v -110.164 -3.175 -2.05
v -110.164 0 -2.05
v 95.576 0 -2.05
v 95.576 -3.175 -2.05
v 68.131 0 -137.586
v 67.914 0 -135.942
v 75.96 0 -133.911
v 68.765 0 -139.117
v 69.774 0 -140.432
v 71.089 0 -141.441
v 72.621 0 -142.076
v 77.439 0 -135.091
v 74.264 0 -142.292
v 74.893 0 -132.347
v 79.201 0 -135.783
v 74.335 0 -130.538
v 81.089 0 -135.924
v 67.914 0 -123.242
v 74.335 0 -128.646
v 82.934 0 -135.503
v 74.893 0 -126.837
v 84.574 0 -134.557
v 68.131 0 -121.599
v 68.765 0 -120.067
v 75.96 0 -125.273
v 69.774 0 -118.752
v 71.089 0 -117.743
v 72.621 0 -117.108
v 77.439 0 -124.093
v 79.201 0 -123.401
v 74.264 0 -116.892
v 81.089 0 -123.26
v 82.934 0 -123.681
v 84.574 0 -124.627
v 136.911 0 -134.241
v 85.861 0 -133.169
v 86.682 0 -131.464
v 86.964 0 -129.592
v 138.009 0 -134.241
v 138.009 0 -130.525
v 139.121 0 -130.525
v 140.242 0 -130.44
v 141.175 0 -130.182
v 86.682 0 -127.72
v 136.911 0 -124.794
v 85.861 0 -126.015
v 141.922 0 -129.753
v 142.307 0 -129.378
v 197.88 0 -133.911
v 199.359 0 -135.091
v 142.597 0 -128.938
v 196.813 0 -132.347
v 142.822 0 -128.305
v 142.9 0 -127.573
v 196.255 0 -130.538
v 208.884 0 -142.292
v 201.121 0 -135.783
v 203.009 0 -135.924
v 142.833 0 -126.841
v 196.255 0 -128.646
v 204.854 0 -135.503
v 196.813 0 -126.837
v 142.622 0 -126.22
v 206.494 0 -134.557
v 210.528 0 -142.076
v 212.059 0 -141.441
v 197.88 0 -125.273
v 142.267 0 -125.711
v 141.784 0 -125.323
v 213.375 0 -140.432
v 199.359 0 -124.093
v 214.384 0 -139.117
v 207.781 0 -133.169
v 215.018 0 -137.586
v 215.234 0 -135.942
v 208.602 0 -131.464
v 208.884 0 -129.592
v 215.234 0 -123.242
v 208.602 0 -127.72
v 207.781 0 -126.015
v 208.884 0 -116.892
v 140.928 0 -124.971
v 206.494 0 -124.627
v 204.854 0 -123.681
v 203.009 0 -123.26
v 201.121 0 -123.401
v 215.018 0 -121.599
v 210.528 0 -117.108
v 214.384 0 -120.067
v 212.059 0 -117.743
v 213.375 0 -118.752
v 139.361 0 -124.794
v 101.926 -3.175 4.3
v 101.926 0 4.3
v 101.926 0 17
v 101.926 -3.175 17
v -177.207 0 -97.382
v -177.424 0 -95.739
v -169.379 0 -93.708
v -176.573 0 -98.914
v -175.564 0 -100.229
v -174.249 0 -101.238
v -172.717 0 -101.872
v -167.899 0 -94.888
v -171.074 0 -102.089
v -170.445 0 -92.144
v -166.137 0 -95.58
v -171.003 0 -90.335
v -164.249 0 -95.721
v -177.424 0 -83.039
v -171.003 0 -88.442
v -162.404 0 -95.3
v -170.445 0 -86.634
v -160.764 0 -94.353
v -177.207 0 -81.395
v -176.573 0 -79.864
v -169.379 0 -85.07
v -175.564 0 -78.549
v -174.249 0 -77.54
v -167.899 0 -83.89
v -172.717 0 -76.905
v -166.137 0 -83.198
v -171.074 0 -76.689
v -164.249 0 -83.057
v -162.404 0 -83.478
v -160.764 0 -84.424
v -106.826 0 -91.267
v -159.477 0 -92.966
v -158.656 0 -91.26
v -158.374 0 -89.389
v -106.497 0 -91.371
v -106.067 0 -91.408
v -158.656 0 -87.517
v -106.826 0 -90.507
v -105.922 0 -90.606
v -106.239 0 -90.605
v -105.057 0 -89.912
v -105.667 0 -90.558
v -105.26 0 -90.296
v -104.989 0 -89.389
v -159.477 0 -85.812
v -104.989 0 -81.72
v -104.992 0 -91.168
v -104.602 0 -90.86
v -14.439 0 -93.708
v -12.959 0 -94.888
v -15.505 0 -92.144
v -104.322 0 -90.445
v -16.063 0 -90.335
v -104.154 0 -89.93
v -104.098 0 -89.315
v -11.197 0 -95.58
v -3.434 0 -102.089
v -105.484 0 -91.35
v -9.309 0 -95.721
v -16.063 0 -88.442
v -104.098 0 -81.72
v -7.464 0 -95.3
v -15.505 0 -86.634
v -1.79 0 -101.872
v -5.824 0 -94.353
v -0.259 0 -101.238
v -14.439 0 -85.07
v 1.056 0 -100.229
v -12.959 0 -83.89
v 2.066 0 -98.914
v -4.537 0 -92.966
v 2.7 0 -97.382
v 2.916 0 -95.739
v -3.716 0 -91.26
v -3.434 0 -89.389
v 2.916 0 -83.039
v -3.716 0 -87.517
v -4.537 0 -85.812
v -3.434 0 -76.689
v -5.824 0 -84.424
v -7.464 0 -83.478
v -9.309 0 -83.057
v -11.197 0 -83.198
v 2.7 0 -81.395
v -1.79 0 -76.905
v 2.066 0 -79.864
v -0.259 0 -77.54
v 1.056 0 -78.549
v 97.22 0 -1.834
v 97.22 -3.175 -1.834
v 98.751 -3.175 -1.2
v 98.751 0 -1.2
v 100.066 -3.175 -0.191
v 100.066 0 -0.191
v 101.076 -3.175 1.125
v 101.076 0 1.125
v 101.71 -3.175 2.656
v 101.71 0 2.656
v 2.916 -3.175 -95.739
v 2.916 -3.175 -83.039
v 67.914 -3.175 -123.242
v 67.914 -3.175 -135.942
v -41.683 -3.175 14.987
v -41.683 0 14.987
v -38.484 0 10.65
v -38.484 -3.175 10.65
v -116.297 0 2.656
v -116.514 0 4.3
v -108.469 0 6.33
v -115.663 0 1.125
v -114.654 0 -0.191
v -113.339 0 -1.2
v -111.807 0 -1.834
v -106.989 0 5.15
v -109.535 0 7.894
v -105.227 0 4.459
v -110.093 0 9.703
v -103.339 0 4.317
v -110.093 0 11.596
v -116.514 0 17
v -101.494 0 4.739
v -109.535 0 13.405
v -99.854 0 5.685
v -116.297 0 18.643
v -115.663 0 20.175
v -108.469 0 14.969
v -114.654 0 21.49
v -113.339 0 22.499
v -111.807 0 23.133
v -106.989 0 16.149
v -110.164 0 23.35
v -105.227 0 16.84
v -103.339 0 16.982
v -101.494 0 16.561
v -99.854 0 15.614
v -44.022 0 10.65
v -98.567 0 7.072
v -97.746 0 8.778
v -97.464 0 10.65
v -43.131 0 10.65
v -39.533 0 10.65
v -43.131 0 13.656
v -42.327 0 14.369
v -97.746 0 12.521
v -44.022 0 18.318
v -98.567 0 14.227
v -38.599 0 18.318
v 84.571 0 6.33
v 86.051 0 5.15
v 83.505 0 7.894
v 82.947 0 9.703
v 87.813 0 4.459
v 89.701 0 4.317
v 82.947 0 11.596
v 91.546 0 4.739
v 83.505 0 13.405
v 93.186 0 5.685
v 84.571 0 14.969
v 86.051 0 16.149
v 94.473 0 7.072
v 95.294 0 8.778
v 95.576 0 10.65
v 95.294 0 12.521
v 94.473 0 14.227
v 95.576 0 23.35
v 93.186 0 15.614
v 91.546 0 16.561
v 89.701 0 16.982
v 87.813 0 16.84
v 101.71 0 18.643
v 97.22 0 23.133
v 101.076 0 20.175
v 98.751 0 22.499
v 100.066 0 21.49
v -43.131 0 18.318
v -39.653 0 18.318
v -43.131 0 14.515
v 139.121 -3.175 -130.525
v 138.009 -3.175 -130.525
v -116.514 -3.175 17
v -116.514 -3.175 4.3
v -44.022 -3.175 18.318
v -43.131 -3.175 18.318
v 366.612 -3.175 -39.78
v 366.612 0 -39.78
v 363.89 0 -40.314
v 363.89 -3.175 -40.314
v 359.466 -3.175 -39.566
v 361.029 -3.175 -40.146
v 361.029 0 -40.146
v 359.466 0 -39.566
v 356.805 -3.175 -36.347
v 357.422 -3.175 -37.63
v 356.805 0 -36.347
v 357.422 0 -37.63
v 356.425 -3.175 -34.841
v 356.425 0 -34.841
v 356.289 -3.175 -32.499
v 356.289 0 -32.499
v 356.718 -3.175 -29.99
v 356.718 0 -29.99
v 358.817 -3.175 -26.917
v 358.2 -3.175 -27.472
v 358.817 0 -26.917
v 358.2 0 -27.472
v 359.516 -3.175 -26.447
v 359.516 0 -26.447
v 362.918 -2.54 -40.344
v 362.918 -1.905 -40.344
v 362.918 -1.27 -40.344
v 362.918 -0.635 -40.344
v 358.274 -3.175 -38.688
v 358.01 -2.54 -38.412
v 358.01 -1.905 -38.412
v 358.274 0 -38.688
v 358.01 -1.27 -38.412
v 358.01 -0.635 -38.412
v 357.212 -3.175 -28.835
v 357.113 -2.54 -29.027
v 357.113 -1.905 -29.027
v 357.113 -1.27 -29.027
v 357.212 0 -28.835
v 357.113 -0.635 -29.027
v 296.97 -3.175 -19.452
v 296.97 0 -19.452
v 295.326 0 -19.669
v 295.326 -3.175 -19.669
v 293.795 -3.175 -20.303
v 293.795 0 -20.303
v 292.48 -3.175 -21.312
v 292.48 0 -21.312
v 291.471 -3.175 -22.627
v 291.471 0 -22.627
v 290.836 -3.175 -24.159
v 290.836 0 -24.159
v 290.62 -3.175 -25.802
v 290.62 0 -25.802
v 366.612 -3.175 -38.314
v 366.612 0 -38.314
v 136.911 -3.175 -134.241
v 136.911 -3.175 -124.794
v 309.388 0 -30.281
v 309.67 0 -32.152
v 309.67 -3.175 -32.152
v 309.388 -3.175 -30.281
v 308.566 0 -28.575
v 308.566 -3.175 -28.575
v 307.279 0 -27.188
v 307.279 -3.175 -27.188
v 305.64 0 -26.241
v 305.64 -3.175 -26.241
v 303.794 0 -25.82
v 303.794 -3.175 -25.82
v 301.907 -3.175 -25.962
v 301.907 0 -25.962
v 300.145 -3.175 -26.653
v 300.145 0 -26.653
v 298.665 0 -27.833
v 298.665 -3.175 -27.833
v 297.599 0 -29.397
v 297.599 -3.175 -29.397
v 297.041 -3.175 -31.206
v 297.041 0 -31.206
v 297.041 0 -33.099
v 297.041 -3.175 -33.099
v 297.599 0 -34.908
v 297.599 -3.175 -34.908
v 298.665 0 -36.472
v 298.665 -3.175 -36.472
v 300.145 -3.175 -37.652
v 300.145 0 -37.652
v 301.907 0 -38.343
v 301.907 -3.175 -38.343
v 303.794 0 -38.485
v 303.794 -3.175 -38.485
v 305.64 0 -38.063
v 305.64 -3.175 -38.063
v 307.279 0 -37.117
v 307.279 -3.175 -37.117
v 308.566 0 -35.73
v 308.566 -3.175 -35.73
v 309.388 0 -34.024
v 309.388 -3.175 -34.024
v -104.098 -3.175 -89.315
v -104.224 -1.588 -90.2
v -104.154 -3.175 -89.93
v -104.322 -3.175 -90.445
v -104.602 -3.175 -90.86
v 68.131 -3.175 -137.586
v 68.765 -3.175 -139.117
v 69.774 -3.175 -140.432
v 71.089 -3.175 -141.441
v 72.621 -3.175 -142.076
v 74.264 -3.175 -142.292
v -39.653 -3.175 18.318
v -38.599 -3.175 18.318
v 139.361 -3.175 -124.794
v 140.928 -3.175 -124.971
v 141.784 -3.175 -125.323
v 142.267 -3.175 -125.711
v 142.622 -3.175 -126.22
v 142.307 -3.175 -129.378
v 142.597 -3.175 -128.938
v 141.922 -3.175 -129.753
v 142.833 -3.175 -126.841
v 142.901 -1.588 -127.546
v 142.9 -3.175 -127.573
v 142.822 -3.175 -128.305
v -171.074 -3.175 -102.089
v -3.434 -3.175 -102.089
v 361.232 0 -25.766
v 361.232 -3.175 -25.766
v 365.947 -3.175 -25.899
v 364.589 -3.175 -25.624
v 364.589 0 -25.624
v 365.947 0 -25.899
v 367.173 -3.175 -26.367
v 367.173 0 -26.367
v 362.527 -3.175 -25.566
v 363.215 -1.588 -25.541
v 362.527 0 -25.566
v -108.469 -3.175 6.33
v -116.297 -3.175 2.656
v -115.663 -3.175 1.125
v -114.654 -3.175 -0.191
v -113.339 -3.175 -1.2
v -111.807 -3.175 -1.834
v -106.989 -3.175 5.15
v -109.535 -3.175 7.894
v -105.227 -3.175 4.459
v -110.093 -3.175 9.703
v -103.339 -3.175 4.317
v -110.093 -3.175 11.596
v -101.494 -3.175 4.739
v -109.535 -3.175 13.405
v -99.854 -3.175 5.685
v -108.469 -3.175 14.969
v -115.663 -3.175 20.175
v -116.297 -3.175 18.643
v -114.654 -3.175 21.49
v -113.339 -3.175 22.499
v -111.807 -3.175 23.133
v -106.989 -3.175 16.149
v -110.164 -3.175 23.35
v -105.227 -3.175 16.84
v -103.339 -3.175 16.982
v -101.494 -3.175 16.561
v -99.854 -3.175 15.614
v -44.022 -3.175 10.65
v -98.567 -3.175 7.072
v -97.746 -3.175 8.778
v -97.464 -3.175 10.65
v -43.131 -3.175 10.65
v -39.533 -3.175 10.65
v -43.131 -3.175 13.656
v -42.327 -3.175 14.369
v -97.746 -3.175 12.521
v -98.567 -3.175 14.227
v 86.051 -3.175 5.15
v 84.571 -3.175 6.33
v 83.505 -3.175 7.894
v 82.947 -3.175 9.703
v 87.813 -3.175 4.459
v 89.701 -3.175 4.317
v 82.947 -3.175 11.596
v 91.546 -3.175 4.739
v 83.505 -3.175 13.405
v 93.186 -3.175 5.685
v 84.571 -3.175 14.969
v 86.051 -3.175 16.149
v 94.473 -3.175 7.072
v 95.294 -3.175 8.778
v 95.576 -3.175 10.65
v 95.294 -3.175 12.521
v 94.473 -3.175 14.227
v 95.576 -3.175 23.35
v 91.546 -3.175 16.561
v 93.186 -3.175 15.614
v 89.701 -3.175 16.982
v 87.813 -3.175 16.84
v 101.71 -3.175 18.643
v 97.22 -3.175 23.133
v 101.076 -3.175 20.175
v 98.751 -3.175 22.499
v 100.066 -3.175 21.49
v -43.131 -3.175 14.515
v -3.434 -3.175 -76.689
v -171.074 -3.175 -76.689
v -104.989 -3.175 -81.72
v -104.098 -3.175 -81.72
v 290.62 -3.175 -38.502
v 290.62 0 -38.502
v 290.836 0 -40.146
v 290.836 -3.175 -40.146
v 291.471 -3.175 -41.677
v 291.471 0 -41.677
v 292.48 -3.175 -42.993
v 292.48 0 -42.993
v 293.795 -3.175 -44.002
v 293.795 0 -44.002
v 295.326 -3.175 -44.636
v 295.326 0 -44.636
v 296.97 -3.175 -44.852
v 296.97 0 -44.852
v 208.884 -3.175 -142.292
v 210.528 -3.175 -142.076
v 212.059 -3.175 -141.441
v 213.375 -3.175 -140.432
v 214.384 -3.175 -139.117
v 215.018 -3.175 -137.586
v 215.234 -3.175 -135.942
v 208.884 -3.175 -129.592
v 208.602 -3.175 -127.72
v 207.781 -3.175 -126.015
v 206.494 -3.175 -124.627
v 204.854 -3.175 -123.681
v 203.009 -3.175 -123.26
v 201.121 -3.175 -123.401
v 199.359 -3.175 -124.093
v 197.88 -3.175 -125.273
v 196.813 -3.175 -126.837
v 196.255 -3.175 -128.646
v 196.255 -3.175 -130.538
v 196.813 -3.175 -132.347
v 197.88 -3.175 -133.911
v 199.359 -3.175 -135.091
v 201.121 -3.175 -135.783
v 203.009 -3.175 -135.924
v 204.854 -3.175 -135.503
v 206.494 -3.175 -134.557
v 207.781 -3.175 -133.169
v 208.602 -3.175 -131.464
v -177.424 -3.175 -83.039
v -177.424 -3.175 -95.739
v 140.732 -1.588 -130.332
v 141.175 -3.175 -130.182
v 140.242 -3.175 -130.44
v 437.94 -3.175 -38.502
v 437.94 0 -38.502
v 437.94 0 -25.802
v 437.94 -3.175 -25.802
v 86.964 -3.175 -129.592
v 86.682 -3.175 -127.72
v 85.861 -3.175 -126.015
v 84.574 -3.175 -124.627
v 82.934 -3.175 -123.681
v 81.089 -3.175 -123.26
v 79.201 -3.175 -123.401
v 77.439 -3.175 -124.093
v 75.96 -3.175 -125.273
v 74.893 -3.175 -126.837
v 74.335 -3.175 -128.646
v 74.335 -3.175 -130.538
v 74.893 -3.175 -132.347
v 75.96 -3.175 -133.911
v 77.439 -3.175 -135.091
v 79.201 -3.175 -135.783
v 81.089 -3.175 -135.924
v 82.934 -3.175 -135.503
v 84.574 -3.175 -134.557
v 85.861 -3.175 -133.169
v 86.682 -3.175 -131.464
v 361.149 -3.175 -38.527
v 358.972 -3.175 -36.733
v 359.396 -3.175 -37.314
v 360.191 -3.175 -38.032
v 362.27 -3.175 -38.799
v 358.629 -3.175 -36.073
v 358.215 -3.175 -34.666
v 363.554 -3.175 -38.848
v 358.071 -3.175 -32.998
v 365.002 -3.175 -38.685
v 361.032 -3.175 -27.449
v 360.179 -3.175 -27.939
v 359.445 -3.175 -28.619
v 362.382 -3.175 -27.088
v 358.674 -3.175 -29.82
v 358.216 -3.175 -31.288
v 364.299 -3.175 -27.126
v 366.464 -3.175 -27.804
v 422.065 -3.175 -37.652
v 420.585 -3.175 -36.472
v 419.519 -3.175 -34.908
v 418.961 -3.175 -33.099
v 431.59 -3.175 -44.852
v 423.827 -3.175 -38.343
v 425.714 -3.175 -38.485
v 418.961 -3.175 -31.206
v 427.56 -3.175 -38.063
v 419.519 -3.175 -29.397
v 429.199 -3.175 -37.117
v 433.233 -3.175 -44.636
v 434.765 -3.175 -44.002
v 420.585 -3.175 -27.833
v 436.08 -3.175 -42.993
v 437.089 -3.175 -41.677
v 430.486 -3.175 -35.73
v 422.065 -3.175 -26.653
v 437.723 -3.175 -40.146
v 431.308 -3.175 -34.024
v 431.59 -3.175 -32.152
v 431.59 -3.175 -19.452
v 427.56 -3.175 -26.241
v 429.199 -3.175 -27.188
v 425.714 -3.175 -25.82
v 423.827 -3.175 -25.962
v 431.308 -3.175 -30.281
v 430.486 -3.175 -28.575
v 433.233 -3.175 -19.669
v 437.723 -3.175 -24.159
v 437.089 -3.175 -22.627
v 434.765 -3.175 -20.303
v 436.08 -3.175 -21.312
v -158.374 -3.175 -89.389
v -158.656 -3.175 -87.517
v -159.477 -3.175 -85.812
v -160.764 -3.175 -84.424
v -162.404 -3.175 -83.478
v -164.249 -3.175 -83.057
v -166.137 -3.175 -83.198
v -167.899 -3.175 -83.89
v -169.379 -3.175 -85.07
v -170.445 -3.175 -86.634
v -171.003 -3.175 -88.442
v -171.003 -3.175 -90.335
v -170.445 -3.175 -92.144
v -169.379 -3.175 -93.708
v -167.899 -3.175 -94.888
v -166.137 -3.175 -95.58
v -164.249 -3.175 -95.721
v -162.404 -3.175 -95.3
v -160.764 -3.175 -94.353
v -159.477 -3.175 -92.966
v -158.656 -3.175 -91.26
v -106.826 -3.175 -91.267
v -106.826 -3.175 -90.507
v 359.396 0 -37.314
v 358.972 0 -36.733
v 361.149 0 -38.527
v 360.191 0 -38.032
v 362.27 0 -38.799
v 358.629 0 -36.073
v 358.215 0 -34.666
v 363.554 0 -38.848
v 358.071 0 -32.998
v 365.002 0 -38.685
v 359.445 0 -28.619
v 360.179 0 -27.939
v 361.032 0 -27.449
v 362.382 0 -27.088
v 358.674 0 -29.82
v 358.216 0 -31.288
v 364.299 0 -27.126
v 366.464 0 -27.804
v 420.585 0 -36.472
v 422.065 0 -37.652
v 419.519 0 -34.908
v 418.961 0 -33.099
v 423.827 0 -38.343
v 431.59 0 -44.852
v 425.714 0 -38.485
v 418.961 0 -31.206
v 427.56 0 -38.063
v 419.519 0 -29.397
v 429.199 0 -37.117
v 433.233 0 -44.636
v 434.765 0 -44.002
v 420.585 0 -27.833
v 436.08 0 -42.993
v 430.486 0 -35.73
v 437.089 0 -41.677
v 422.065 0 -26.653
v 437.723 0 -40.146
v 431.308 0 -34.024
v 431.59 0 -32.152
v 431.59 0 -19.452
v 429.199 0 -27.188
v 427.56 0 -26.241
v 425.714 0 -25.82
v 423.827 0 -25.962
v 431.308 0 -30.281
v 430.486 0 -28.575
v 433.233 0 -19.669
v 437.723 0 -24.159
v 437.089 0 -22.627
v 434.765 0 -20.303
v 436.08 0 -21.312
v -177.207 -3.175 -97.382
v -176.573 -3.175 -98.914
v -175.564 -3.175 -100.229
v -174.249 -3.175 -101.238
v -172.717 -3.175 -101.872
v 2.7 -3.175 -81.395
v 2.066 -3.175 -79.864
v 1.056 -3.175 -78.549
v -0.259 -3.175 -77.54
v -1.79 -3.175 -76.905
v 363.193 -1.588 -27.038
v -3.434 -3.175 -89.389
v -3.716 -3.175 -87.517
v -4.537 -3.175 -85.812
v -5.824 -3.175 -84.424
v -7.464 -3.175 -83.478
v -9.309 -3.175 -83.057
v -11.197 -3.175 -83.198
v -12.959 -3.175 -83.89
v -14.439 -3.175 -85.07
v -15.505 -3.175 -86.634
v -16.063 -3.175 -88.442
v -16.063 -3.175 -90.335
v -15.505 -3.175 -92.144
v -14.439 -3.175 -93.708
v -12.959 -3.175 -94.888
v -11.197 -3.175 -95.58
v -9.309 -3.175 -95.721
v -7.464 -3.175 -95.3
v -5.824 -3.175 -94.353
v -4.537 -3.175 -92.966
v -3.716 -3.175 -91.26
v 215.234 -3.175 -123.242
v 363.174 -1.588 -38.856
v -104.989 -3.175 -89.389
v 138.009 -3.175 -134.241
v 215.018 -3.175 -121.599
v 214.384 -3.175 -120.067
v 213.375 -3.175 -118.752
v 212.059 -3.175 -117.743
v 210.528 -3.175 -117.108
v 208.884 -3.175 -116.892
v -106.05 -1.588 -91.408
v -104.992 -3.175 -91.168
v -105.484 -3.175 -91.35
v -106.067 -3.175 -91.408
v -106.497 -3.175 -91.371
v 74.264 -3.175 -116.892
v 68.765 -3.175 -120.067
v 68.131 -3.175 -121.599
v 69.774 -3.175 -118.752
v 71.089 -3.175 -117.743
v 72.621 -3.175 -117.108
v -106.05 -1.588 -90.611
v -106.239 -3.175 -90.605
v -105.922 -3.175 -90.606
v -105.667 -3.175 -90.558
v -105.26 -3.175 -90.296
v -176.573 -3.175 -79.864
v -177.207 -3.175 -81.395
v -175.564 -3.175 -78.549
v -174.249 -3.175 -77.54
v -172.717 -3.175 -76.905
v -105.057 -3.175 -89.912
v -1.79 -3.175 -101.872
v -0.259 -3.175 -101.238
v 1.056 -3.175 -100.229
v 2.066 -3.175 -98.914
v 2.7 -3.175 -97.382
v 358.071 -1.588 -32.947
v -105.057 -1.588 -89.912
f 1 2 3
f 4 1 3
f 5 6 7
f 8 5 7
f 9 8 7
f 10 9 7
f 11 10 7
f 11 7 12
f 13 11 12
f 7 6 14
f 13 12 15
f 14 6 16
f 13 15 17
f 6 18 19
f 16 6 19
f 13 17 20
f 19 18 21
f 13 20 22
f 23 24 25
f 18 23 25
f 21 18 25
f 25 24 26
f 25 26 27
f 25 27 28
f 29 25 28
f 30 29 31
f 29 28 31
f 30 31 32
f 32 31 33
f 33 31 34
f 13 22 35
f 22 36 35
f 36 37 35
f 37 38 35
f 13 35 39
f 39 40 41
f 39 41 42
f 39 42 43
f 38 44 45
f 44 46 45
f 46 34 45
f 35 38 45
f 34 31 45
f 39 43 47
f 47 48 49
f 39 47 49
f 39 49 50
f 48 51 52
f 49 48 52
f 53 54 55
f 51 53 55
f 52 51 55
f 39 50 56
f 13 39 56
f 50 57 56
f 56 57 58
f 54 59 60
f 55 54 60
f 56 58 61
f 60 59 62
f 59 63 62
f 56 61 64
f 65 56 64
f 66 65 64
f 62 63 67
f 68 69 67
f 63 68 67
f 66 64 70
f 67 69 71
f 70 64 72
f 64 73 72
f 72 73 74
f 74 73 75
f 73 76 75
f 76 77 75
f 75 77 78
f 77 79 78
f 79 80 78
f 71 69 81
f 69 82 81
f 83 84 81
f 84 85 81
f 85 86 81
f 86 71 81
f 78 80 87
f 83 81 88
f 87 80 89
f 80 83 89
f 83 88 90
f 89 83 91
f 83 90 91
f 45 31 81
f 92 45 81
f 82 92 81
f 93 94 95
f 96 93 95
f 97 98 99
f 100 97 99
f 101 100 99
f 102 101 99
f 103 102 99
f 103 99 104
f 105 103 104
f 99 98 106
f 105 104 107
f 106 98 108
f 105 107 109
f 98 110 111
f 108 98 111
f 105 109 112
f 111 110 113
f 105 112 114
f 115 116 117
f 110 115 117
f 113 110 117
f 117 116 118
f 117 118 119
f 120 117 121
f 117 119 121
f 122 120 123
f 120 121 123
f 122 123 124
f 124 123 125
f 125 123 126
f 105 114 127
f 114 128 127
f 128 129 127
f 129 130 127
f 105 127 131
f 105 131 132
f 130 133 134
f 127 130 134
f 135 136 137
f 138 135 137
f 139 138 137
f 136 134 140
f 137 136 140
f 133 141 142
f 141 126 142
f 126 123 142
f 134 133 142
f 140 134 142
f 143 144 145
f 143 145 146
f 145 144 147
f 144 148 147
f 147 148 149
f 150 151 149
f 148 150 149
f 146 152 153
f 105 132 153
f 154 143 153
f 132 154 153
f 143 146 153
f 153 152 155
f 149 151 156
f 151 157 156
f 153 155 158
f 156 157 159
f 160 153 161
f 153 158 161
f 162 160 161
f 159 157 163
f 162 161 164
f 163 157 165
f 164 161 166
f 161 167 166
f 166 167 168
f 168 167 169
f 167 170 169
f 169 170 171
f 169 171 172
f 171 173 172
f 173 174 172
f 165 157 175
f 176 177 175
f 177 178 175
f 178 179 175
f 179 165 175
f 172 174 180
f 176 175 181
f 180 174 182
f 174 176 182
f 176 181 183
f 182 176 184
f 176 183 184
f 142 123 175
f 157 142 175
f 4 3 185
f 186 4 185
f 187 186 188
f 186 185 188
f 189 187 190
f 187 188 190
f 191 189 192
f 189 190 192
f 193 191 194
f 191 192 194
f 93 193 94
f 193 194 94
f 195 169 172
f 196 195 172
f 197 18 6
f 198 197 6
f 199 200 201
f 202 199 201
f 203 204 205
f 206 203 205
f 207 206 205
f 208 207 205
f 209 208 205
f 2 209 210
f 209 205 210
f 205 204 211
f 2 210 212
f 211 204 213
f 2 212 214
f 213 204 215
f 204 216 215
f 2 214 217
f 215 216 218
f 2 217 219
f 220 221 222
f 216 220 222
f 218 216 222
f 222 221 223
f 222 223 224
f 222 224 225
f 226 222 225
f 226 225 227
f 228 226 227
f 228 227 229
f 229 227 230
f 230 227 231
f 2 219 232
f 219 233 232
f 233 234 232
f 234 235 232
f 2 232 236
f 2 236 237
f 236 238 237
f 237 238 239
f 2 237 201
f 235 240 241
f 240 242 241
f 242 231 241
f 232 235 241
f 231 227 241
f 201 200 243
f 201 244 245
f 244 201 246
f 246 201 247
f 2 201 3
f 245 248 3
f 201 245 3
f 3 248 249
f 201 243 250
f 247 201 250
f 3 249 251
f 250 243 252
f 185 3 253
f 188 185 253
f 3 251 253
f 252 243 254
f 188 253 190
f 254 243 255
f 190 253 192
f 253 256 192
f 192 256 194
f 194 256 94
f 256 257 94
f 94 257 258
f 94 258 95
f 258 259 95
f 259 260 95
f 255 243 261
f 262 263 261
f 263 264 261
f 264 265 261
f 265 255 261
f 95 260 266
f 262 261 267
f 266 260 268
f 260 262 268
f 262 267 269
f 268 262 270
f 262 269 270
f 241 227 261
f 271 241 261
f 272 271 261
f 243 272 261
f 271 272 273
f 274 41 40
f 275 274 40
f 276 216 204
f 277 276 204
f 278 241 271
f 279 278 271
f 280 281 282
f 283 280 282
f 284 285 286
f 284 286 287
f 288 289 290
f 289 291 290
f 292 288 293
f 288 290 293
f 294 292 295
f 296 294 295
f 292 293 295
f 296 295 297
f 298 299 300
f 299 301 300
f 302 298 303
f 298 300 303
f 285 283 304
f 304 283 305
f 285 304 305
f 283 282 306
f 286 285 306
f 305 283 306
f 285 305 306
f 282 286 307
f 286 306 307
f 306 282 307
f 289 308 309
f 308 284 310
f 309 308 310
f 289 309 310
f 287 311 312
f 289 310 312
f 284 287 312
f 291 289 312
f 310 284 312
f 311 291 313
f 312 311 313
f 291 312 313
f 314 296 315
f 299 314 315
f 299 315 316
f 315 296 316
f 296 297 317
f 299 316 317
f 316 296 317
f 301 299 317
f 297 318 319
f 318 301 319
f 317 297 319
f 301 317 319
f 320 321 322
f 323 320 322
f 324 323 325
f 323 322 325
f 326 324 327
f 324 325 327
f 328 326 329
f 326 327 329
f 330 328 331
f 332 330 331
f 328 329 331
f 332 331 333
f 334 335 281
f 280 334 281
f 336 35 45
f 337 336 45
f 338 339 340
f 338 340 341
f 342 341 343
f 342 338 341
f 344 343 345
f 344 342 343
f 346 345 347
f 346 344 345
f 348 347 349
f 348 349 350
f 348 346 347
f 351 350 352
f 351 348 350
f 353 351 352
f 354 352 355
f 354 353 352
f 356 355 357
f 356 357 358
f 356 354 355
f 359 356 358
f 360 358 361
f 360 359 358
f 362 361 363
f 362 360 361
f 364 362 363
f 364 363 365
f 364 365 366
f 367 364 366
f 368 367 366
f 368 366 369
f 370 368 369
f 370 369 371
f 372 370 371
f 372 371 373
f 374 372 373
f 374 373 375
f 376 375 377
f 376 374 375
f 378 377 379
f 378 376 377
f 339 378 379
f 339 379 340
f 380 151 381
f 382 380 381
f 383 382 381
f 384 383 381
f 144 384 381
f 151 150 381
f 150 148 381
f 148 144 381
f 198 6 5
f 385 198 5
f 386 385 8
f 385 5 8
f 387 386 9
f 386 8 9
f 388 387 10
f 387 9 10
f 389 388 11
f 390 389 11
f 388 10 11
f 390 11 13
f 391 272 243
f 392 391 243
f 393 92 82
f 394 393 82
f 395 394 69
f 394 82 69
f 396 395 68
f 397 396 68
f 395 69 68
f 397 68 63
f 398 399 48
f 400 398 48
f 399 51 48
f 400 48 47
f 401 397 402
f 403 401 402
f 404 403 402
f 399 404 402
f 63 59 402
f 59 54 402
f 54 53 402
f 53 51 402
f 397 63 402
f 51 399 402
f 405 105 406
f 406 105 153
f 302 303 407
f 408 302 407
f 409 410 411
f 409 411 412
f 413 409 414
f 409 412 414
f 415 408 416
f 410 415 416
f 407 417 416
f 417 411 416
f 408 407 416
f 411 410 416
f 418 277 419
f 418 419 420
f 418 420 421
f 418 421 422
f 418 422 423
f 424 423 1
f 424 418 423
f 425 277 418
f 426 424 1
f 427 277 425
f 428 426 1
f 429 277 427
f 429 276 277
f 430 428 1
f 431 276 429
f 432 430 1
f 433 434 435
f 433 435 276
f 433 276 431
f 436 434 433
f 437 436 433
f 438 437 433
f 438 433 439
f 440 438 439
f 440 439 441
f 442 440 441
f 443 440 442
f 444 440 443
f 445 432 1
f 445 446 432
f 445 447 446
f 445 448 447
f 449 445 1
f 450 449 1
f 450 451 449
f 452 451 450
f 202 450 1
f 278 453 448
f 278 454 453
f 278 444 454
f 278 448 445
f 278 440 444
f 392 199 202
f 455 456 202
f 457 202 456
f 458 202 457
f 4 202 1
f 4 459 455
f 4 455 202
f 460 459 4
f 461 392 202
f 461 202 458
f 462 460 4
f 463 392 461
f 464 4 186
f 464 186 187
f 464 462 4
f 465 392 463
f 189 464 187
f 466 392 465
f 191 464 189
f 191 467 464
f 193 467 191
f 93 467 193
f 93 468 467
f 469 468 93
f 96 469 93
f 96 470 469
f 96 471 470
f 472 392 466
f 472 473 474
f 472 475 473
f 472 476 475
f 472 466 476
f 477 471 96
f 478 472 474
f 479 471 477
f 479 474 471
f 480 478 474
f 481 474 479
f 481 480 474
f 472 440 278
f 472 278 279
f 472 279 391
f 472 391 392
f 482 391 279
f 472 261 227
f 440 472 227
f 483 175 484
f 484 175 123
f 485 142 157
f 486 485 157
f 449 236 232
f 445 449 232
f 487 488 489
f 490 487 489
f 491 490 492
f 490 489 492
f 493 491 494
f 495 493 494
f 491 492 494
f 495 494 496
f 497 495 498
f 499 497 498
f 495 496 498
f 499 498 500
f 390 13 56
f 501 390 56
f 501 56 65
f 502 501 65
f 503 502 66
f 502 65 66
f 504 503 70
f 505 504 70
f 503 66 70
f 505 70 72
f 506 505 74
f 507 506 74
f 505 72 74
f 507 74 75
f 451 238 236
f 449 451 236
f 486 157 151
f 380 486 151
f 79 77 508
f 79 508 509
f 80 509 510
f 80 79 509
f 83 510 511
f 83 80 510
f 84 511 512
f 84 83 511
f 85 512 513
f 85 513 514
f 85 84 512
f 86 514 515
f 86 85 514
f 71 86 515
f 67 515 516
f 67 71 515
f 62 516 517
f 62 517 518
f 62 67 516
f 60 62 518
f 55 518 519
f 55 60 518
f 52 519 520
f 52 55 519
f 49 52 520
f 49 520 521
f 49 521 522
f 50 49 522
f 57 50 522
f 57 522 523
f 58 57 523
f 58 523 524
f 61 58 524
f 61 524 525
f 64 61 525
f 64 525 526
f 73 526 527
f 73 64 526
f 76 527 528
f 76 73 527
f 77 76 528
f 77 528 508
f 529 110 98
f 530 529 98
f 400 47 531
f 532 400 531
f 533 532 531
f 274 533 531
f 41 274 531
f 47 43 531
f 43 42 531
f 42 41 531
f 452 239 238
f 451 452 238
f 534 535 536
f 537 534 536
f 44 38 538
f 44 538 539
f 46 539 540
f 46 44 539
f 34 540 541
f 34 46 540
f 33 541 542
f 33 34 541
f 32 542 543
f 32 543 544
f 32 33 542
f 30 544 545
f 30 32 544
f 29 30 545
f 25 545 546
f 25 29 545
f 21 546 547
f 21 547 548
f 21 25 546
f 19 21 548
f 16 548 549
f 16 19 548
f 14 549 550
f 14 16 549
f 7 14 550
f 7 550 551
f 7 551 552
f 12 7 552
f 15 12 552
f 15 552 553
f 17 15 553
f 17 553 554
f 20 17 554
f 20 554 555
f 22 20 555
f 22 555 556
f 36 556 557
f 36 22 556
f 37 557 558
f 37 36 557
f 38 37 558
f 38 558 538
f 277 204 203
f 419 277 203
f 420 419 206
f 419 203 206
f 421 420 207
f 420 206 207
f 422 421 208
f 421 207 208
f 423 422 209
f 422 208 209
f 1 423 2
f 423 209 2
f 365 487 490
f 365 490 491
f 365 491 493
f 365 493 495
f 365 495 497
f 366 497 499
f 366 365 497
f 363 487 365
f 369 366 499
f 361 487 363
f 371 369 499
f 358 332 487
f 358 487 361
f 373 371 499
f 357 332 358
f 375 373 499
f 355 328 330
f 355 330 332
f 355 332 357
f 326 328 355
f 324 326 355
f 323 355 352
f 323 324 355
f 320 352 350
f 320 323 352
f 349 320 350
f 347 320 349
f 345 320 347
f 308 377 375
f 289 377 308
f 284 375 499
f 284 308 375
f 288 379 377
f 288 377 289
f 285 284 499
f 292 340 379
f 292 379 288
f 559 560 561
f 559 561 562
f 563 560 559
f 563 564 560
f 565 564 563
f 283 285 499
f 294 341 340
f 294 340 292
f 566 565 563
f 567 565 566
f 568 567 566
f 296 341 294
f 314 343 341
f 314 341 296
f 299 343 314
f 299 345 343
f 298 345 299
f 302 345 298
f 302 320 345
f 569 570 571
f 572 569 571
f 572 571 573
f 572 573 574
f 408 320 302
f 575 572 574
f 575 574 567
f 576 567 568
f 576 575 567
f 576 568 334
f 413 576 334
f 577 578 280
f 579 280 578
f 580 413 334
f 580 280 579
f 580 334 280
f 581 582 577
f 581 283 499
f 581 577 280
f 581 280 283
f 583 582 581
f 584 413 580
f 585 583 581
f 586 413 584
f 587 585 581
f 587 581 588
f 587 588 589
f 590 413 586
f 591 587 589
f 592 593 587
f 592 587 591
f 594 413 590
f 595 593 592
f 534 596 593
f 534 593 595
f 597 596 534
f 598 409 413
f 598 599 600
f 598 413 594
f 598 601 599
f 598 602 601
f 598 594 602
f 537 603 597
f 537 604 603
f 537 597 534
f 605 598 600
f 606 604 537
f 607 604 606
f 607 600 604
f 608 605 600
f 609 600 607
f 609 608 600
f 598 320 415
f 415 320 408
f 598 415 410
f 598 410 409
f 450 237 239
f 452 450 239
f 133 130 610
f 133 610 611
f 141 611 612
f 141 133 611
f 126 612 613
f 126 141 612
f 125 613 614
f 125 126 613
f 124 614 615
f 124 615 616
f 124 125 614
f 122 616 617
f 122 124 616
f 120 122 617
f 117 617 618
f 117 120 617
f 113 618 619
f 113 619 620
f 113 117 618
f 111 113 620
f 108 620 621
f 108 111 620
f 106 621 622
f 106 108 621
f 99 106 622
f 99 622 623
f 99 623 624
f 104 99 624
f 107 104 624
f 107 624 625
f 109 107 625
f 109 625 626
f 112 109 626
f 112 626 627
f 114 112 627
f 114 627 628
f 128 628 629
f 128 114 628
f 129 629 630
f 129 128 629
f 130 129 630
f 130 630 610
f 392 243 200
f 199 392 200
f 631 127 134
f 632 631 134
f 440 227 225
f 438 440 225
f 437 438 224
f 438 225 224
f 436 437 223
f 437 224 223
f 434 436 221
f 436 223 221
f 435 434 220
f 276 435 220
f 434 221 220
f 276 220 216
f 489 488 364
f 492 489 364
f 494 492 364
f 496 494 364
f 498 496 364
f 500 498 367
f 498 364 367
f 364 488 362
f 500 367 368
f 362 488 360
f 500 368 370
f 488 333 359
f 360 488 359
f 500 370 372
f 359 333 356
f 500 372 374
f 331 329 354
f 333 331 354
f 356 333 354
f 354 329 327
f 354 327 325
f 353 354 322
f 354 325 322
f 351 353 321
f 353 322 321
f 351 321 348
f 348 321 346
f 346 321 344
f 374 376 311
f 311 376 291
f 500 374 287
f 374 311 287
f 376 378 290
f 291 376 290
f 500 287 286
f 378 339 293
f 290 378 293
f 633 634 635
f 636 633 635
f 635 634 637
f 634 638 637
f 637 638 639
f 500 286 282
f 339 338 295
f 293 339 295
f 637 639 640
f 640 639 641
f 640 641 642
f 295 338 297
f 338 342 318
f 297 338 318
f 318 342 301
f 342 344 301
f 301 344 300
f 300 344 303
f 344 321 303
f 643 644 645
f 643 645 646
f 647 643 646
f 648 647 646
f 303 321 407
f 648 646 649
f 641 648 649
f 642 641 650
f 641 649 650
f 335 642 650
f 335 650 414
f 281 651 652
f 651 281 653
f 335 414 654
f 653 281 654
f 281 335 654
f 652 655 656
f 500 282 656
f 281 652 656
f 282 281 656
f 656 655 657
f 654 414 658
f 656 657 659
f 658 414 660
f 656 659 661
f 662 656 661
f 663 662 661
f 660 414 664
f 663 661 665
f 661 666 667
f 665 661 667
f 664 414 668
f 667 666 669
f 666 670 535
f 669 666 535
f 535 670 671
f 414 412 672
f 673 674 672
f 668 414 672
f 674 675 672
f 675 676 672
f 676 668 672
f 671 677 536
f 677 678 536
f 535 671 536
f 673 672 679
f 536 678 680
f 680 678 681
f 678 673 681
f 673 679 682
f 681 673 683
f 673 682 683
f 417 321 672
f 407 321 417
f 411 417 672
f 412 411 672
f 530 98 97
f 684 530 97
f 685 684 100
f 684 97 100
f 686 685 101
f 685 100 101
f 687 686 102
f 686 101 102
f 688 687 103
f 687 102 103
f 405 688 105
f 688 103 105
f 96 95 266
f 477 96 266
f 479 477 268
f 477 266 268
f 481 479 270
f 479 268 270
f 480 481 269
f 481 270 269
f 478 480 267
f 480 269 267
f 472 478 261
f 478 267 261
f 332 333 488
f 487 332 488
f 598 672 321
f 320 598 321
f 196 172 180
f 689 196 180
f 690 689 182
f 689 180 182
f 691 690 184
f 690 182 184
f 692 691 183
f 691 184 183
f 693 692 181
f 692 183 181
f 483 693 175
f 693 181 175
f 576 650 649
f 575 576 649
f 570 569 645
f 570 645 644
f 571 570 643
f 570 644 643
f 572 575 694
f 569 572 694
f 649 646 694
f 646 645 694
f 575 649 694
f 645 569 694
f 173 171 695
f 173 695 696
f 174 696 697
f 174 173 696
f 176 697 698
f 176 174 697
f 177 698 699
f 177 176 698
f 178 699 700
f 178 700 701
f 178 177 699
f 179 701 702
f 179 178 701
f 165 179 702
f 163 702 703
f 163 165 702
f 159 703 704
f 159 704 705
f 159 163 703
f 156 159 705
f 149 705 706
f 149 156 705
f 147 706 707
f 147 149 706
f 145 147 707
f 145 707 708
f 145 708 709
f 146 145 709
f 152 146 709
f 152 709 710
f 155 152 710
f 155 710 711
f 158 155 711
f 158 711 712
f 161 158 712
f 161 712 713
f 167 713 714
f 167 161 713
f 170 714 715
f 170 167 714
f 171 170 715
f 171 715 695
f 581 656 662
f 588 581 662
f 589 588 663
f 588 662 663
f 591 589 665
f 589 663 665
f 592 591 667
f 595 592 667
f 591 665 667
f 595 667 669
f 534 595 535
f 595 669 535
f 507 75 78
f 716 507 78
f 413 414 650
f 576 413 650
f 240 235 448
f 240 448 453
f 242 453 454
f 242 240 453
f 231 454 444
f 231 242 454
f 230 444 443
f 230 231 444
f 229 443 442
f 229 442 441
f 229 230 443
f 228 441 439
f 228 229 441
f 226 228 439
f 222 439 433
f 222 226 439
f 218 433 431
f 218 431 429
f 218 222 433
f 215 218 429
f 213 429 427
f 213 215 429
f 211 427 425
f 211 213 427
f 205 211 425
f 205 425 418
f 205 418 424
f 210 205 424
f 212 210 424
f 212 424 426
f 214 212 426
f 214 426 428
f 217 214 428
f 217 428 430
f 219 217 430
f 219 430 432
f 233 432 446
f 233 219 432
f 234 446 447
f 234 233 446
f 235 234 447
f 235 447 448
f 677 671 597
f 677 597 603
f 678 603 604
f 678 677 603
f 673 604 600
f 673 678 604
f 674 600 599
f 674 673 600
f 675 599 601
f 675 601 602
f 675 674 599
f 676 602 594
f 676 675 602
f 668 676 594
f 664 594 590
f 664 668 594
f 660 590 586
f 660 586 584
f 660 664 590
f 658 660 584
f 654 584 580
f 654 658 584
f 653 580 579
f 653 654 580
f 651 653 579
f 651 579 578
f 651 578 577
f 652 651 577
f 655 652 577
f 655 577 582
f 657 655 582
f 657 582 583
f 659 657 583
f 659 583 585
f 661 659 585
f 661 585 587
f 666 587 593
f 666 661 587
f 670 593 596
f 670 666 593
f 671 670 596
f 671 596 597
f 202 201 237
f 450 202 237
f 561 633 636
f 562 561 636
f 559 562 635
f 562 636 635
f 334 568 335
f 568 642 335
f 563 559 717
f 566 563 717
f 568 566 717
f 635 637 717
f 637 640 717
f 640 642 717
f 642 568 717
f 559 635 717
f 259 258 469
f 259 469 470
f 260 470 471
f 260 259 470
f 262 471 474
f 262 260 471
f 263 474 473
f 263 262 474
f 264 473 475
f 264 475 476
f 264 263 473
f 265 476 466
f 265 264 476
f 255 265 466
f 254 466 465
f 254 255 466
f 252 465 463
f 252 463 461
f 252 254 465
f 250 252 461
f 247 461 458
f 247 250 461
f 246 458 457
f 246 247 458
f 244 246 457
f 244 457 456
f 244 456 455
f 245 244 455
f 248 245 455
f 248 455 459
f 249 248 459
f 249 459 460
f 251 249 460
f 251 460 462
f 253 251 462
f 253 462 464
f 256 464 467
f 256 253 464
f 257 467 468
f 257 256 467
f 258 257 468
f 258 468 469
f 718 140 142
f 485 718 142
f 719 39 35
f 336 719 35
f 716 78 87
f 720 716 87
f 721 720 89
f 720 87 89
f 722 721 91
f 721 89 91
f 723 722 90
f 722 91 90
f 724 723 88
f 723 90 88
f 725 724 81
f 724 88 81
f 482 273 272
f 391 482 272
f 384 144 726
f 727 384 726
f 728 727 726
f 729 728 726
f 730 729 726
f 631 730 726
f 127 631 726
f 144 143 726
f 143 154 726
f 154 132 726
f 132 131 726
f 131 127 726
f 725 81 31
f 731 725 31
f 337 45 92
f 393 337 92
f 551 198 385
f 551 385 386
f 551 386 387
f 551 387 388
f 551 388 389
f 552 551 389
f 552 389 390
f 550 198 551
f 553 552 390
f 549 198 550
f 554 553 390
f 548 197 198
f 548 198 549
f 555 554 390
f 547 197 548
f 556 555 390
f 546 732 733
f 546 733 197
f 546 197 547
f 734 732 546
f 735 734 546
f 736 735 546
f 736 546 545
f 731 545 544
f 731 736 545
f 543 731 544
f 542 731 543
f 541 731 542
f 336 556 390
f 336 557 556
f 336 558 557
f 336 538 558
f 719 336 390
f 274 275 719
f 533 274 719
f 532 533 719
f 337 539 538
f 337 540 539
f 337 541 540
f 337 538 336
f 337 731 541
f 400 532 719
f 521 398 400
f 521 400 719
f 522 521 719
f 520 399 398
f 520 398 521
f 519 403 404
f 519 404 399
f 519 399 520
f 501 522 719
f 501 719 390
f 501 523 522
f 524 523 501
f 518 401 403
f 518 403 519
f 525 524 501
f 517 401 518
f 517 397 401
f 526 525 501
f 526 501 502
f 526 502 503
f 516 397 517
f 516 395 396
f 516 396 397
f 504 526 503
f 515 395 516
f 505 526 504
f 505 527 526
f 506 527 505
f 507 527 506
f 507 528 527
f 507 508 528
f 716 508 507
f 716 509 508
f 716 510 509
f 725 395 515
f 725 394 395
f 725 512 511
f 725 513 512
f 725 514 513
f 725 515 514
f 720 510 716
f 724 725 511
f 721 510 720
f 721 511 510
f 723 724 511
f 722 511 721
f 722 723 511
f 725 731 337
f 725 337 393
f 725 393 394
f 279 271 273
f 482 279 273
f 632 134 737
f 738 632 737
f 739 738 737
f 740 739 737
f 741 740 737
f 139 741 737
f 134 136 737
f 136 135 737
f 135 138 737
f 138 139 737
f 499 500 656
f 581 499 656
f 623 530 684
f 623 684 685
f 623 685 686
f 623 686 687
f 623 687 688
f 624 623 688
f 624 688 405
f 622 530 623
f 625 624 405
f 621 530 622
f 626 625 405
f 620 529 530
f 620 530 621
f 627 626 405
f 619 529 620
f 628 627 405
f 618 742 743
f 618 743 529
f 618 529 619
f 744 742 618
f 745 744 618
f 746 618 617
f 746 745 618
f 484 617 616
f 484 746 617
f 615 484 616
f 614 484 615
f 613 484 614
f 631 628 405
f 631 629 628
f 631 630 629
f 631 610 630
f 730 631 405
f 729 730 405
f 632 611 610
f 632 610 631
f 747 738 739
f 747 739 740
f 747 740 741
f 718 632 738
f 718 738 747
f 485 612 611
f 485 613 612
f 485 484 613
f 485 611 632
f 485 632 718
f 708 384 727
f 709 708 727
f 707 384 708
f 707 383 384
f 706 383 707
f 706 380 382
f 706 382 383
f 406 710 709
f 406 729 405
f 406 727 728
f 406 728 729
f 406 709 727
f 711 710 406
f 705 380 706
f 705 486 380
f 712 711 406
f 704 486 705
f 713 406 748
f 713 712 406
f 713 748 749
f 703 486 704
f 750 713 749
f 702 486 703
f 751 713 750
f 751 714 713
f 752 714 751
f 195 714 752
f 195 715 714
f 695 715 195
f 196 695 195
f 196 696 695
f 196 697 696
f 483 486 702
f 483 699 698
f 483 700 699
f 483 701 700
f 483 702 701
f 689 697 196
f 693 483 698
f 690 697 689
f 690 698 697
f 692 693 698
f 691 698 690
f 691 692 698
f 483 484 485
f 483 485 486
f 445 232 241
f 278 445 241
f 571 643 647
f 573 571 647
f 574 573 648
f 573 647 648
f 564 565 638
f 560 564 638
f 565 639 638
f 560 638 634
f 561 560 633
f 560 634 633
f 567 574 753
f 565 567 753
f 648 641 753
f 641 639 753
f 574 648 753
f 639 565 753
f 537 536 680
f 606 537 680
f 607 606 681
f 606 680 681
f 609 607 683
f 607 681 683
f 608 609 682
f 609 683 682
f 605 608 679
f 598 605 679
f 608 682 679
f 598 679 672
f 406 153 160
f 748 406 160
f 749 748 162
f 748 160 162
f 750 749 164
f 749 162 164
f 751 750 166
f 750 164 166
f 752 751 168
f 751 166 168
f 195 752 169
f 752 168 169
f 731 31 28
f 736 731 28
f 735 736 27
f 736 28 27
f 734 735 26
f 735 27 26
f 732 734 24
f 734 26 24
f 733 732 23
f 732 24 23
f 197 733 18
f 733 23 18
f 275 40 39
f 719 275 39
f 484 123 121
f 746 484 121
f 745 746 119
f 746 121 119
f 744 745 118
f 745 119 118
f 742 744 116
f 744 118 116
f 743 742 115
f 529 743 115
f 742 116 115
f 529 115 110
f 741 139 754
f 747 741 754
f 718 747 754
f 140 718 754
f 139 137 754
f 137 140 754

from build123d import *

# Parameters (mm, degrees)
F1_R     = 6.35
F2_DEPTH = 3.175
F3_R     = 6.35
F4_DEPTH = 3.175
F5_R     = 6.35
F6_DEPTH = 3.175
F7_R     = 6.35
F8_DEPTH = 3.175


# Not quite as in the source:
# - a length typed as a fraction of an inch, garbled in the dataset ("3 / 203.2 mm" for 3/8 in), is restored


with BuildPart() as f2:
    # F1 (on Front) → F2 (new body)
    with BuildSketch(Plane.XZ):
        with BuildLine():
            Line((95.5763677621, 23.3495529922), (-110.1636322379, 23.3495529922))
            ThreePointArc((-110.1636322379, 23.3495529922), (-114.6537602984, 21.4896810527), (-116.5136322379, 16.9995529922))
            Line((-116.5136322379, 16.9995529922), (-116.5136322379, 4.2995529922))
            ThreePointArc((-116.5136322379, 4.2995529922), (-114.6537602984, -0.1905750684), (-110.1636322379, -2.0504470078))
            Line((-110.1636322379, -2.0504470078), (95.5763677621, -2.0504470078))
            ThreePointArc((95.5763677621, -2.0504470078), (100.0664958226, -0.1905750684), (101.9263677621, 4.2995529922))
            Line((101.9263677621, 4.2995529922), (101.9263677621, 16.9995529922))
            ThreePointArc((101.9263677621, 16.9995529922), (100.0664958226, 21.4896810527), (95.5763677621, 23.3495529922))
        make_face()
        with Locations((-103.8136322379, 10.6495529922)):
            Circle(F1_R, mode=Mode.SUBTRACT)
        Polygon((-41.6826481417, 14.9866065492), (-38.4835676154, 10.6495529922), (-39.5325840524, 10.6495529922), (-42.3271638406, 14.3689456712), (-43.1311300379, 13.655614494), (-43.1311300379, 10.6495529922), (-44.0223744027, 10.6495529922), (-44.0223744027, 18.3182827531), (-43.1311300379, 18.3182827531), (-43.1311300379, 14.5149687592), (-39.653430746, 18.3182827531), (-38.5993790301, 18.3182827531), align=None, mode=Mode.SUBTRACT)
        with Locations((89.2263677621, 10.6495529922)):
            Circle(F1_R, mode=Mode.SUBTRACT)
    extrude(amount=F2_DEPTH)


with BuildPart() as f4:
    # F3 (on Front) → F4 (new body)
    with BuildSketch(Plane.XZ):
        with BuildLine():
            Line((-3.4336355138, -76.6887728453), (-171.0736355138, -76.6887728453))
            ThreePointArc((-171.0736355138, -76.6887728453), (-175.5637635743, -78.5486447847), (-177.4236355138, -83.0387728453))
            Line((-177.4236355138, -83.0387728453), (-177.4236355138, -95.7387728453))
            ThreePointArc((-177.4236355138, -95.7387728453), (-175.5637635743, -100.2289009058), (-171.0736355138, -102.0887728453))
            Line((-171.0736355138, -102.0887728453), (-3.4336355138, -102.0887728453))
            ThreePointArc((-3.4336355138, -102.0887728453), (1.0564925468, -100.2289009058), (2.9163644862, -95.7387728453))
            Line((2.9163644862, -95.7387728453), (2.9163644862, -83.0387728453))
            ThreePointArc((2.9163644862, -83.0387728453), (1.0564925468, -78.5486447847), (-3.4336355138, -76.6887728453))
        make_face()
        with Locations((-9.7836355138, -89.3887728453)):
            Circle(F3_R, mode=Mode.SUBTRACT)
        with Locations((-164.7236355138, -89.3887728453)):
            Circle(F3_R, mode=Mode.SUBTRACT)
        with BuildLine():
            add(Edge.make_bspline(
                [(-104.6017276977, -90.8599134965), (-105.1052555874, -91.4079196832), (-106.0502095939, -91.4079196832)],
                knots=[0, 0, 0, 1, 1, 1], degree=2))
            add(Edge.make_bspline(
                [(-106.0502095939, -91.4079196832), (-106.5419884995, -91.4079196832), (-106.8256425441, -91.266931874)],
                knots=[0, 0, 0, 1, 1, 1], degree=2))
            Line((-106.8256425441, -91.266931874), (-106.8256425441, -90.5066047605))
            add(Edge.make_bspline(
                [(-106.8256425441, -90.5066047605), (-106.4530319057, -90.6106671911), (-106.0502095939, -90.6106671911)],
                knots=[0, 0, 0, 1, 1, 1], degree=2))
            add(Edge.make_bspline(
                [(-106.0502095939, -90.6106671911), (-105.5298974411, -90.6106671911), (-105.2596708069, -90.29596226)],
                knots=[0, 0, 0, 1, 1, 1], degree=2))
            add(Edge.make_bspline(
                [(-105.2596708069, -90.29596226), (-104.9894441728, -89.9812573289), (-104.9894441728, -89.3887728453)],
                knots=[0, 0, 0, 1, 1, 1], degree=2))
            Line((-104.9894441728, -89.3887728453), (-104.9894441728, -81.7200430843))
            Line((-104.9894441728, -81.7200430843), (-104.0981998079, -81.7200430843))
            Line((-104.0981998079, -81.7200430843), (-104.0981998079, -89.3149220881))
            add(Edge.make_bspline(
                [(-104.0981998079, -89.3149220881), (-104.0981998079, -90.3119073098), (-104.6017276977, -90.8599134965)],
                knots=[0, 0, 0, 1, 1, 1], degree=2))
        make_face(mode=Mode.SUBTRACT)
    extrude(amount=F4_DEPTH)


with BuildPart() as f6:
    # F5 (on Front) → F6 (new body)
    with BuildSketch(Plane.XZ):
        with BuildLine():
            Line((208.8844542503, -116.8920610428), (74.2644542503, -116.8920610428))
            ThreePointArc((74.2644542503, -116.8920610428), (69.7743261898, -118.7519329823), (67.9144542503, -123.2420610428))
            Line((67.9144542503, -123.2420610428), (67.9144542503, -135.9420610428))
            ThreePointArc((67.9144542503, -135.9420610428), (69.7743261898, -140.4321891033), (74.2644542503, -142.2920610428))
            Line((74.2644542503, -142.2920610428), (208.8844542503, -142.2920610428))
            ThreePointArc((208.8844542503, -142.2920610428), (213.3745823109, -140.4321891033), (215.2344542503, -135.9420610428))
            Line((215.2344542503, -135.9420610428), (215.2344542503, -123.2420610428))
            ThreePointArc((215.2344542503, -123.2420610428), (213.3745823109, -118.7519329823), (208.8844542503, -116.8920610428))
        make_face()
        with Locations((202.5344542503, -129.5920610428)):
            Circle(F5_R, mode=Mode.SUBTRACT)
        with Locations((80.6144542503, -129.5920610428)):
            Circle(F5_R, mode=Mode.SUBTRACT)
        with BuildLine():
            add(Edge.make_bspline(
                [(139.3608329236, -124.7941682377), (142.9005294922, -124.7941682377), (142.9005294922, -127.5461169134)],
                knots=[0, 0, 0, 1, 1, 1], degree=2))
            add(Edge.make_bspline(
                [(142.9005294922, -127.5461169134), (142.9005294922, -128.9810172748), (141.9215304704, -129.7532583194)],
                knots=[0, 0, 0, 1, 1, 1], degree=2))
            add(Edge.make_bspline(
                [(141.9215304704, -129.7532583194), (140.9425314487, -130.525499364), (139.1209936701, -130.525499364)],
                knots=[0, 0, 0, 1, 1, 1], degree=2))
            Line((139.1209936701, -130.525499364), (138.0086357531, -130.525499364))
            Line((138.0086357531, -130.525499364), (138.0086357531, -134.2409402132))
            Line((138.0086357531, -134.2409402132), (136.9107508945, -134.2409402132))
            Line((136.9107508945, -134.2409402132), (136.9107508945, -124.7941682377))
            Line((136.9107508945, -124.7941682377), (139.3608329236, -124.7941682377))
        make_face(mode=Mode.SUBTRACT)
    extrude(amount=F6_DEPTH)


with BuildPart() as f8:
    # F7 (on Front) → F8 (new body)
    with BuildSketch(Plane.XZ):
        with BuildLine():
            Line((431.5898662186, -19.4524478495), (296.9698662186, -19.4524478495))
            ThreePointArc((296.9698662186, -19.4524478495), (292.479738158, -21.312319789), (290.6198662186, -25.8024478495))
            Line((290.6198662186, -25.8024478495), (290.6198662186, -38.5024478495))
            ThreePointArc((290.6198662186, -38.5024478495), (292.479738158, -42.99257591), (296.9698662186, -44.8524478495))
            Line((296.9698662186, -44.8524478495), (431.5898662186, -44.8524478495))
            ThreePointArc((431.5898662186, -44.8524478495), (436.0799942791, -42.99257591), (437.9398662186, -38.5024478495))
            Line((437.9398662186, -38.5024478495), (437.9398662186, -25.8024478495))
            ThreePointArc((437.9398662186, -25.8024478495), (436.0799942791, -21.312319789), (431.5898662186, -19.4524478495))
        make_face()
        with BuildLine():
            add(Edge.make_bspline(
                [(366.4639369183, -27.8038420737), (364.8282573372, -27.0380036572), (363.1925777562, -27.0380036572)],
                knots=[0, 0, 0, 1, 1, 1], degree=2))
            add(Edge.make_bspline(
                [(363.1925777562, -27.0380036572), (360.8194241444, -27.0380036572), (359.4453272324, -28.6185302658)],
                knots=[0, 0, 0, 1, 1, 1], degree=2))
            add(Edge.make_bspline(
                [(359.4453272324, -28.6185302658), (358.0712303204, -30.1990568745), (358.0712303204, -32.9472506985)],
                knots=[0, 0, 0, 1, 1, 1], degree=2))
            add(Edge.make_bspline(
                [(358.0712303204, -32.9472506985), (358.0712303204, -35.7710828846), (359.3964774569, -37.3137903122)],
                knots=[0, 0, 0, 1, 1, 1], degree=2))
            add(Edge.make_bspline(
                [(359.3964774569, -37.3137903122), (360.7217245933, -38.8564977398), (363.1736681657, -38.8564977398)],
                knots=[0, 0, 0, 1, 1, 1], degree=2))
            add(Edge.make_bspline(
                [(363.1736681657, -38.8564977398), (364.6801322114, -38.8564977398), (366.6120620441, -38.3144228112)],
                knots=[0, 0, 0, 1, 1, 1], degree=2))
            Line((366.6120620441, -38.3144228112), (366.6120620441, -39.7799160775))
            add(Edge.make_bspline(
                [(366.6120620441, -39.7799160775), (365.1150527937, -40.344052195), (362.9183886935, -40.344052195)],
                knots=[0, 0, 0, 1, 1, 1], degree=2))
            add(Edge.make_bspline(
                [(362.9183886935, -40.344052195), (359.7384258857, -40.344052195), (358.0097741512, -38.4121223623)],
                knots=[0, 0, 0, 1, 1, 1], degree=2))
            add(Edge.make_bspline(
                [(358.0097741512, -38.4121223623), (356.2811224167, -36.4801925296), (356.2811224167, -32.9251895095)],
                knots=[0, 0, 0, 1, 1, 1], degree=2))
            add(Edge.make_bspline(
                [(356.2811224167, -32.9251895095), (356.2811224167, -30.7001610236), (357.1131444001, -29.0266622615)],
                knots=[0, 0, 0, 1, 1, 1], degree=2))
            add(Edge.make_bspline(
                [(357.1131444001, -29.0266622615), (357.9451663835, -27.3531634994), (359.5162381969, -26.447078953)],
                knots=[0, 0, 0, 1, 1, 1], degree=2))
            add(Edge.make_bspline(
                [(359.5162381969, -26.447078953), (361.0873100103, -25.5409944067), (363.2146389452, -25.5409944067)],
                knots=[0, 0, 0, 1, 1, 1], degree=2))
            add(Edge.make_bspline(
                [(363.2146389452, -25.5409944067), (365.4774866122, -25.5409944067), (367.1730465632, -26.3667131933)],
                knots=[0, 0, 0, 1, 1, 1], degree=2))
            Line((367.1730465632, -26.3667131933), (366.4639369183, -27.8038420737))
        make_face(mode=Mode.SUBTRACT)
        with Locations((425.2398662186, -32.1524478495)):
            Circle(F7_R, mode=Mode.SUBTRACT)
        with Locations((303.3198662186, -32.1524478495)):
            Circle(F7_R, mode=Mode.SUBTRACT)
    extrude(amount=F8_DEPTH)


solid = Compound([f2.part, f4.part, f6.part, f8.part])
